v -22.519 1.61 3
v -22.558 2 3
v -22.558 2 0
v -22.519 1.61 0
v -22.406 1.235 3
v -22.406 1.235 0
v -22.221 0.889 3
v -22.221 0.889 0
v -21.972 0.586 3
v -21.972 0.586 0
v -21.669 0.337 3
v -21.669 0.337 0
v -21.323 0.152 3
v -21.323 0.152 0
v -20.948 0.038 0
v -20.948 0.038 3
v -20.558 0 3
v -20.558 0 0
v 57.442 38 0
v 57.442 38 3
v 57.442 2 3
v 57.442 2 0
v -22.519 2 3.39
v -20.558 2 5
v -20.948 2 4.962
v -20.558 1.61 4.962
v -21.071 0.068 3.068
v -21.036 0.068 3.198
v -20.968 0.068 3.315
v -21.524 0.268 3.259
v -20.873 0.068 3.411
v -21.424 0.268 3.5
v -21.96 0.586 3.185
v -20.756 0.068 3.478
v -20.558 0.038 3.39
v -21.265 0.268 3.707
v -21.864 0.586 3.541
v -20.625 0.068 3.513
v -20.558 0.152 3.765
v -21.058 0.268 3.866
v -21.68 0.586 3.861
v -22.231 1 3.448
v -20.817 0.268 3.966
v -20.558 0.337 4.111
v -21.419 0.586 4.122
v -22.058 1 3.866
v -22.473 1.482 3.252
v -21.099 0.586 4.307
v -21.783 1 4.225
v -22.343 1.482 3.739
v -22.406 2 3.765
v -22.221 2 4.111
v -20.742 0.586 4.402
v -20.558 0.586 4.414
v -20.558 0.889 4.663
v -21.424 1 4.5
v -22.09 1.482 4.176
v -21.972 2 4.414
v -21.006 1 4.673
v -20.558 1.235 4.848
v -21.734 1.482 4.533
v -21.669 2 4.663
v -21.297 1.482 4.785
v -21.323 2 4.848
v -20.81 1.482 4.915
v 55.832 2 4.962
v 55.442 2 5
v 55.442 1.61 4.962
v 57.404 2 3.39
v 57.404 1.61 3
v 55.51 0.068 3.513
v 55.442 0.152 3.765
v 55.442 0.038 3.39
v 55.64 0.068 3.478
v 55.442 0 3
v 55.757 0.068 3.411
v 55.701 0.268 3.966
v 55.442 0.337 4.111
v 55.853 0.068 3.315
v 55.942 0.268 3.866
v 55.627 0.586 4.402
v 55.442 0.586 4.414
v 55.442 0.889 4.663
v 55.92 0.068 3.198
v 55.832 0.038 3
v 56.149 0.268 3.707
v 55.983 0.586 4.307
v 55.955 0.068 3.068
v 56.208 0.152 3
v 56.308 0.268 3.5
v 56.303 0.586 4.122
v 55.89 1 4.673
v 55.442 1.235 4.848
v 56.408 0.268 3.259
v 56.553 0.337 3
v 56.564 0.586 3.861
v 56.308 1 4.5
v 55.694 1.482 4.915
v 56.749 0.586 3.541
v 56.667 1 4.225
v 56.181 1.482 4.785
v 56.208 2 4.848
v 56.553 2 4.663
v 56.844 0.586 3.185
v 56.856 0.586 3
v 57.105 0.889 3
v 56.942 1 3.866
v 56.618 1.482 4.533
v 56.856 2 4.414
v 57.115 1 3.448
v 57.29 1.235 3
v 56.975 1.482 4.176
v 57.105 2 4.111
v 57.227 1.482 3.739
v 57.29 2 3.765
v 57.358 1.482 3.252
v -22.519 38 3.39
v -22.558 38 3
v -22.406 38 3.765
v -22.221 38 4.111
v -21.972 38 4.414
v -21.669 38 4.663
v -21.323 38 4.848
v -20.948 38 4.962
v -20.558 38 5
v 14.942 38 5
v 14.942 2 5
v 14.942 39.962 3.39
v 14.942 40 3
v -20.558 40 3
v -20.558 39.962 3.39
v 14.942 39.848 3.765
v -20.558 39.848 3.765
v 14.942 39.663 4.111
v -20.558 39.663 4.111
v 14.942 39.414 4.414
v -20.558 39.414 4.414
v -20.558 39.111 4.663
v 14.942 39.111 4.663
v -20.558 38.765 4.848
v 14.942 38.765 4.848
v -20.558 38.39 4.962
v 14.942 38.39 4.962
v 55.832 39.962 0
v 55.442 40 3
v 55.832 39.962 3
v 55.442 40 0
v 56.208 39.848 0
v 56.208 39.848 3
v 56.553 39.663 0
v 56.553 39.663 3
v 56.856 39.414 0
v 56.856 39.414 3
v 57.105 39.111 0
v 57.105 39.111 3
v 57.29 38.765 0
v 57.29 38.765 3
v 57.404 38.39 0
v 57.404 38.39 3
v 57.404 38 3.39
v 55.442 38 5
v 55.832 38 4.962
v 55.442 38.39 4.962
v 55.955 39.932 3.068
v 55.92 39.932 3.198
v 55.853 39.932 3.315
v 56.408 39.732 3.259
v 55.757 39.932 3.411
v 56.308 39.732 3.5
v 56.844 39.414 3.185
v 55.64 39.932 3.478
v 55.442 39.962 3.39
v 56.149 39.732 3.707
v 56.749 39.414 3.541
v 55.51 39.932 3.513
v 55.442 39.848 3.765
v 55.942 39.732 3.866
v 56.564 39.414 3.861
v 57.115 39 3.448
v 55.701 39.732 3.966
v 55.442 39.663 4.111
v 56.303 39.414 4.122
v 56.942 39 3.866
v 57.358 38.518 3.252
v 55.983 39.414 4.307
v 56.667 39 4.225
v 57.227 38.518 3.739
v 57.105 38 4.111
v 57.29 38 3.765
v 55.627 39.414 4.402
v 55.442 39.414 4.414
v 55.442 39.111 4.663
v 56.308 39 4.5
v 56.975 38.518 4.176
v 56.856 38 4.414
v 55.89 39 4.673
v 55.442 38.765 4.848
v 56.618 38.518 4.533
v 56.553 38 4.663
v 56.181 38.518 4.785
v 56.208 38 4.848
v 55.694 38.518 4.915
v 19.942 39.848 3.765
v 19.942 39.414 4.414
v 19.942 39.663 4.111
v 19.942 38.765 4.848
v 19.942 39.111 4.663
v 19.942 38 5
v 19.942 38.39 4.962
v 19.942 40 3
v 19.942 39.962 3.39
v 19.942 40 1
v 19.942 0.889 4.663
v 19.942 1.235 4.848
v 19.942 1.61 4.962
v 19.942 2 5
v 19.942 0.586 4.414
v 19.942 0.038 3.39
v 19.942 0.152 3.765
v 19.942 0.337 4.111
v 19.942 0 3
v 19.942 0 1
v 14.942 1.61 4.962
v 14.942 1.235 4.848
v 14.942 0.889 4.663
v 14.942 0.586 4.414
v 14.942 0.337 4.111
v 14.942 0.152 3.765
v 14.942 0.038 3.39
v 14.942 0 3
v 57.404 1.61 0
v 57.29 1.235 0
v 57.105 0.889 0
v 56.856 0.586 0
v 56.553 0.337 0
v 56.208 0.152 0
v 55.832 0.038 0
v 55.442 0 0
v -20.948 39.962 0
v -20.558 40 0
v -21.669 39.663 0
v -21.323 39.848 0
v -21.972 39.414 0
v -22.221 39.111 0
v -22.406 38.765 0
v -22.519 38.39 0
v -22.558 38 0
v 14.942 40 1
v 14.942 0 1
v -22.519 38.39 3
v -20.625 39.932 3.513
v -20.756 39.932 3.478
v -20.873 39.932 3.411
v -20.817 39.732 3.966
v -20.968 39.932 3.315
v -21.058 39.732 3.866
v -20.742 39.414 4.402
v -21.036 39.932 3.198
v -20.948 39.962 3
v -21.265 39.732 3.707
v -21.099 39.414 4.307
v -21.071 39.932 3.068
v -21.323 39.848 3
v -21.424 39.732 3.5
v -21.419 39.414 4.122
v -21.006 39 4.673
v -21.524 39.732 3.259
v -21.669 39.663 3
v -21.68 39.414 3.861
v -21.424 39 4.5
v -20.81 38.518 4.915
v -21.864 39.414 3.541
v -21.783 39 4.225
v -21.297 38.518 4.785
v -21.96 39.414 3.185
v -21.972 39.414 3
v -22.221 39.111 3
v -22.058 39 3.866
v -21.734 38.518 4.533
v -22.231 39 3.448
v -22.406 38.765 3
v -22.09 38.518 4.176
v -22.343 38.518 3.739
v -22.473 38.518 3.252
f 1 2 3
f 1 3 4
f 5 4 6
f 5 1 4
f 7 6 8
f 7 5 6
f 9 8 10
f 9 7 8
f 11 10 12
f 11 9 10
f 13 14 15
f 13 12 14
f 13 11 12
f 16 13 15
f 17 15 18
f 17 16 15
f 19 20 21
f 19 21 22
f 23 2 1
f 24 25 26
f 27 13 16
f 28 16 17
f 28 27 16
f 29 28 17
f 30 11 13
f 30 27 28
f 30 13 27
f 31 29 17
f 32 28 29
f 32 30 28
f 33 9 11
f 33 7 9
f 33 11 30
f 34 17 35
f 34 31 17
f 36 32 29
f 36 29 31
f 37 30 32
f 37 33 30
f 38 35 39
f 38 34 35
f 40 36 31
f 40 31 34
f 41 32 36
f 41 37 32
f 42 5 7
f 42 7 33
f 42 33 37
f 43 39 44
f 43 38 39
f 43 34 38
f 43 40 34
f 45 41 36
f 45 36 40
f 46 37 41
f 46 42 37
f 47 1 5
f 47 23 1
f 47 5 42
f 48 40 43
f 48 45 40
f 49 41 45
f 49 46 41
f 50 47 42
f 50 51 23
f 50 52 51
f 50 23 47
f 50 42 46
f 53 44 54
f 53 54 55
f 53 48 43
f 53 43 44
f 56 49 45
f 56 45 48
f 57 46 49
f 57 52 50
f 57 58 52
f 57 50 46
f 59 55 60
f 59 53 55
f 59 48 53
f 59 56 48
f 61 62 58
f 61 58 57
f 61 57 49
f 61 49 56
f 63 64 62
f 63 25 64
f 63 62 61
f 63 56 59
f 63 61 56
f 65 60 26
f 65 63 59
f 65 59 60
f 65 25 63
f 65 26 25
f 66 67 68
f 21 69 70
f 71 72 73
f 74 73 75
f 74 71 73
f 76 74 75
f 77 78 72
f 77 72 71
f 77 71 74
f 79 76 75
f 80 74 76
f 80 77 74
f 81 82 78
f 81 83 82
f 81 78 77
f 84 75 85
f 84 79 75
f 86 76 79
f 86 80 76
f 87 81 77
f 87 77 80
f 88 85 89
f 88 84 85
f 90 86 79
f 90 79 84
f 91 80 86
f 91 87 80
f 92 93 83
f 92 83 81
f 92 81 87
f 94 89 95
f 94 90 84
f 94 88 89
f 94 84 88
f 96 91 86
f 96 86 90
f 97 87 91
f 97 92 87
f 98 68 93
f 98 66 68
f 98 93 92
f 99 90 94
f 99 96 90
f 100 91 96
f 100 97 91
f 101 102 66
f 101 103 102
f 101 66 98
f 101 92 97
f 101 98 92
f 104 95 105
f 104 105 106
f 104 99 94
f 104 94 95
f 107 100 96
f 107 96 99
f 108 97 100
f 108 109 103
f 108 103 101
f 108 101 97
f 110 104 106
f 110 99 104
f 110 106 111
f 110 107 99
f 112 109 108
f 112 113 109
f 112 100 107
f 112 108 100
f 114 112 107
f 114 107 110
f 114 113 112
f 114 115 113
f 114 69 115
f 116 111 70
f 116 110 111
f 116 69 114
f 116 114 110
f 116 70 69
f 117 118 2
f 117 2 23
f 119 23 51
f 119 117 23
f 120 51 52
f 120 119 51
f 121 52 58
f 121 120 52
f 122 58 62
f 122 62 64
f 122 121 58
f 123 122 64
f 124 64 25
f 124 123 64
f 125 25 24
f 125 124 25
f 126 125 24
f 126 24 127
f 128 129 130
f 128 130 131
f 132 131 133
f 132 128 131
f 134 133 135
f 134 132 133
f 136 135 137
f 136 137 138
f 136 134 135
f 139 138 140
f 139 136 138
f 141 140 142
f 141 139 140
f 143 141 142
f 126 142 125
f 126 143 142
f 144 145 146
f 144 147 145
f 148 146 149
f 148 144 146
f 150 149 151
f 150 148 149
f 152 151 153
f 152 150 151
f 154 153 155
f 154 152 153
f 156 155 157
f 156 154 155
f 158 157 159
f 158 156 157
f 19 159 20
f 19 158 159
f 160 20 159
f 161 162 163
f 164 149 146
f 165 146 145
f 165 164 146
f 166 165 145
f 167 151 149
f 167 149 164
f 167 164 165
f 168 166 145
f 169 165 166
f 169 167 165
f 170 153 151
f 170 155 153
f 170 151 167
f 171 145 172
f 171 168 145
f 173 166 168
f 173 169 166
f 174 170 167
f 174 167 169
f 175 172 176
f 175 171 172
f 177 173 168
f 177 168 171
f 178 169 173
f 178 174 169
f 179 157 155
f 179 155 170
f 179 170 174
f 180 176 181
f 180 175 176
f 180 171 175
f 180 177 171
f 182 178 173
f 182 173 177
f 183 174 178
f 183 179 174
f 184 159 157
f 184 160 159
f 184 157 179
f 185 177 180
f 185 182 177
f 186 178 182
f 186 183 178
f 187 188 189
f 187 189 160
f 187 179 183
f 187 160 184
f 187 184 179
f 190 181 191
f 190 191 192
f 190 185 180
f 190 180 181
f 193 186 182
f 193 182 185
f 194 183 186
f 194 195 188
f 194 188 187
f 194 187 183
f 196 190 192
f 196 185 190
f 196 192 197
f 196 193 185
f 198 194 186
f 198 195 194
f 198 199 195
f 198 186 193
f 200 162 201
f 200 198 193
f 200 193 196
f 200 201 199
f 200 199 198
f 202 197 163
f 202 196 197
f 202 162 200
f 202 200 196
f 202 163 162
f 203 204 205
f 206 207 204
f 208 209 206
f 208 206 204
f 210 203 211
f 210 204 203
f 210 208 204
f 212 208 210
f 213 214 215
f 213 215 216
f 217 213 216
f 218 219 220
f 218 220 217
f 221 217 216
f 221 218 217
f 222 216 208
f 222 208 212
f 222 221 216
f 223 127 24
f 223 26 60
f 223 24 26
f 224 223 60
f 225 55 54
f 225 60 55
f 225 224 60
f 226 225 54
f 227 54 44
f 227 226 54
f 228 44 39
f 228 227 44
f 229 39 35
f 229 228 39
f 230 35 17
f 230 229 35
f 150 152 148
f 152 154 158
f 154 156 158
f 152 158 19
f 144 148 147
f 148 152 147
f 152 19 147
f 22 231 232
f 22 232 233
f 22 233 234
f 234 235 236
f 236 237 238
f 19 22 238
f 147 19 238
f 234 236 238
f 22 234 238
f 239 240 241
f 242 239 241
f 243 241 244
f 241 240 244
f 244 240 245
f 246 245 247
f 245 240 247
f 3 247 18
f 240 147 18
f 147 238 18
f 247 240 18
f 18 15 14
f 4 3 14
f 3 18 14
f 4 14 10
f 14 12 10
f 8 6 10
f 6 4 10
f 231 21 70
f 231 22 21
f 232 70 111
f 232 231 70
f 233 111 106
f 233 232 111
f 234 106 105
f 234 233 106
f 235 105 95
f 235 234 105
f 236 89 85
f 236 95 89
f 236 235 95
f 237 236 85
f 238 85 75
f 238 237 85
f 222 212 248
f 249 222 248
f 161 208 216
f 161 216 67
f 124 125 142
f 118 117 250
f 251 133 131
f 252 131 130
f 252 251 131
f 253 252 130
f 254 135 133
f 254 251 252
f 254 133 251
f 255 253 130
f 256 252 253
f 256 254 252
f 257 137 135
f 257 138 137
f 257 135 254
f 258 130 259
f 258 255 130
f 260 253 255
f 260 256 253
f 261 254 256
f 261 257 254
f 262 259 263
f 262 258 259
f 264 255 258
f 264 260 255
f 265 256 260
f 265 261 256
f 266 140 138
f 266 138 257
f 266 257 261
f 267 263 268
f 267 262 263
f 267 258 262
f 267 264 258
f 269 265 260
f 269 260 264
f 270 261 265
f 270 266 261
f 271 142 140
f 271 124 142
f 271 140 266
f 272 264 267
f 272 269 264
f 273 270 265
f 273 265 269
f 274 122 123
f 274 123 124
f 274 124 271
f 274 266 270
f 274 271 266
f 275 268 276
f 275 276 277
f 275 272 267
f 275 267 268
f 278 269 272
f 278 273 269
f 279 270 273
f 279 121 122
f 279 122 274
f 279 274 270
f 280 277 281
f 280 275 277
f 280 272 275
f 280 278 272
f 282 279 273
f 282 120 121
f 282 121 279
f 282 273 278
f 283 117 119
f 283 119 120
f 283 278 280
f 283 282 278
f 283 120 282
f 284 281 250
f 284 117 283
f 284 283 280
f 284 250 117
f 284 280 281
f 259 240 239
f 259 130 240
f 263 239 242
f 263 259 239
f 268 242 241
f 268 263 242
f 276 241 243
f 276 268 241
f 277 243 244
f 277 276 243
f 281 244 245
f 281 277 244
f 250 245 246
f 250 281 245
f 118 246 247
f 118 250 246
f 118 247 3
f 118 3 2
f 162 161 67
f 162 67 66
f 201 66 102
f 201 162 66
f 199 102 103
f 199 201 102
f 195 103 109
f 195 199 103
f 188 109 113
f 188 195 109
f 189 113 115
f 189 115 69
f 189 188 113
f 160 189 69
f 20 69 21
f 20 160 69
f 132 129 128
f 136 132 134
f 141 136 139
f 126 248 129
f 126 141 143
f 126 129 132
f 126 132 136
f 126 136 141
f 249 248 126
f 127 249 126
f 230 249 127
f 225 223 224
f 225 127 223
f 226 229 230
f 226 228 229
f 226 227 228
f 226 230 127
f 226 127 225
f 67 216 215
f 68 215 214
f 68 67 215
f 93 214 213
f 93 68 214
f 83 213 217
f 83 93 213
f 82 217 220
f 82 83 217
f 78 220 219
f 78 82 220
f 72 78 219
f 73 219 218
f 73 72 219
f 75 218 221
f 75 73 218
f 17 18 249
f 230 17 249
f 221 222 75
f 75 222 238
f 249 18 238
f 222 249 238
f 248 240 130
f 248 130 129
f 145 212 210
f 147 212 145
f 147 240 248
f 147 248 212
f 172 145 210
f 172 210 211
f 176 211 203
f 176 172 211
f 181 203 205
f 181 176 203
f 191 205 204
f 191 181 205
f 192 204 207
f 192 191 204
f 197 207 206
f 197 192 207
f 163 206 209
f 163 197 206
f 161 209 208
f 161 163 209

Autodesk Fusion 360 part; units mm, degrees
sketch "Sketch1" plane through (0, 0, 0) normal (0, 1, 0) x (1, 0, 0)
  line L0 (-22.5578, -5) -> (57.4422, -5)
  line L1 (57.4422, -5) -> (57.4422, 0)
  line L2 (57.4422, 0) -> (-22.5578, 0)
  line L3 (-22.5578, 0) -> (-22.5578, -5)
  line L4 (14.9422, -5) -> (19.9422, -5)
  line L5 (19.9422, -5) -> (19.9422, -1)
  line L6 (19.9422, -1) -> (14.9422, -1)
  line L7 (14.9422, -1) -> (14.9422, -5)
  dimension "d1" = 5
  dimension "d2" = 80
  dimension "d3" = 5
  dimension "d4" = 4
  dimension "d5" = 37.5
extrude "Extrude1" add sketch "Sketch1" along normal blind 40 contours L0 L1 L2 L3 L5 L6 L7
fillet "Fillet1" radius 2 1 edges at (57.4422, 20, 5)
fillet "Fillet2" radius 2 1 edges at (-22.5578, 20, 5)
fillet "Fillet3" radius 2 3 edges at (-22.5578, 0, 1.5) (-21.972, 0, 4.4142) (-2.8078, 0, 5)
fillet "Fillet4" radius 2 3 edges at (37.6922, 0, 5) (56.8564, 0, 4.4142) (57.4422, 0, 1.5)
fillet "Fillet5" radius 2 3 edges at (37.6922, 40, 5) (56.8564, 40, 4.4142) (57.4422, 40, 1.5)
fillet "Fillet6" radius 2 3 edges at (-22.5578, 40, 1.5) (-21.972, 40, 4.4142) (-2.8078, 40, 5)
